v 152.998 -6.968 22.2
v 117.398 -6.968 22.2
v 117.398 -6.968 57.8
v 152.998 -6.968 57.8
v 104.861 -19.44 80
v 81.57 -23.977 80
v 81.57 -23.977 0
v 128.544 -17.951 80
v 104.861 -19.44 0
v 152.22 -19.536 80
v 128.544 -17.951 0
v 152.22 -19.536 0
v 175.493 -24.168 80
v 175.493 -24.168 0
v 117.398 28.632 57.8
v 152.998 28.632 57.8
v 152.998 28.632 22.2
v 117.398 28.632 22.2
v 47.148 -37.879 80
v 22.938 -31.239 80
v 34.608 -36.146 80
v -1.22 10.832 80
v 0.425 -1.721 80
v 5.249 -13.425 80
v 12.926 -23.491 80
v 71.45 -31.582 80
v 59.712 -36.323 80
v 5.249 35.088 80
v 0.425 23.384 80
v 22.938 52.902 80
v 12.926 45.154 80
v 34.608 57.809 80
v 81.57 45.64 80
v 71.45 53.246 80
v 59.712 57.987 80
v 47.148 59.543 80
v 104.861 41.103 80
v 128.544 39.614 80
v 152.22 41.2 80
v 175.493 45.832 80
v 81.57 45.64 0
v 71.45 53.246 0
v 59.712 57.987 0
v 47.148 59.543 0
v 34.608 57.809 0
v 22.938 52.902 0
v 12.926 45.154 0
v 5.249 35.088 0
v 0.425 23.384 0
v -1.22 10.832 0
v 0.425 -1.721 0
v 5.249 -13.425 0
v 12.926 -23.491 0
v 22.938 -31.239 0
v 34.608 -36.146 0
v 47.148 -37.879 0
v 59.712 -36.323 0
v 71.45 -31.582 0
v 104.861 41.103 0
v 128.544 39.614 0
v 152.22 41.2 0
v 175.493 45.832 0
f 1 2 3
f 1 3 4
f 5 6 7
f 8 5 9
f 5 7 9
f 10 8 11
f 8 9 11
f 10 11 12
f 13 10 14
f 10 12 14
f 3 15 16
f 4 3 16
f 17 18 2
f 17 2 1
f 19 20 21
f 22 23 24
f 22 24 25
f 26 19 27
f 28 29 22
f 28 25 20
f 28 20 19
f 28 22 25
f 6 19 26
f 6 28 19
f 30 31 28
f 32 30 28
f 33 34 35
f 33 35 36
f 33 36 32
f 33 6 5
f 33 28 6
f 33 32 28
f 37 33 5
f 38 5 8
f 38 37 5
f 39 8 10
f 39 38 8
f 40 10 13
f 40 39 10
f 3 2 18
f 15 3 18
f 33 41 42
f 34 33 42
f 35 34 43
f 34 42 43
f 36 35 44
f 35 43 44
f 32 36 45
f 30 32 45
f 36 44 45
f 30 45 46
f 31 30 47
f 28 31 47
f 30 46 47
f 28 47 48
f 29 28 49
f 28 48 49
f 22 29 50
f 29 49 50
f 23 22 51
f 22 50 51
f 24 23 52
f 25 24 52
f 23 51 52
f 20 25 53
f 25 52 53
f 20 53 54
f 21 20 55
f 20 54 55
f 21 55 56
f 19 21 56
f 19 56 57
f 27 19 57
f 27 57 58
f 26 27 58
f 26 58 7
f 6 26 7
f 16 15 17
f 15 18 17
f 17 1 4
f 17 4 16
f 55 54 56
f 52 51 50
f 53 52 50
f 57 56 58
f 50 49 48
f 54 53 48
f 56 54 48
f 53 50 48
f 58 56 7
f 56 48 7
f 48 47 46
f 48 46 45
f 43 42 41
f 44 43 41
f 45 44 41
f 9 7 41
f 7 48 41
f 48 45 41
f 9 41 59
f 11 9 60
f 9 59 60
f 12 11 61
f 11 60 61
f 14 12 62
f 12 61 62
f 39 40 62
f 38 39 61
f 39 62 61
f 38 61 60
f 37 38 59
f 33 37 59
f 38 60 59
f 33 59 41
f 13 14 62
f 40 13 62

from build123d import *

# Parameters (mm, degrees)
DODANIE_WYCI_GNI_CIE2_DEPTH     = 80
SZKIC5_W                        = 35.6
SZKIC5_H                        = 35.6
WYTNIJ_WYCI_GNI_CIE1_DEPTH      = 17.8
WYTNIJ_WYCI_GNI_CIE1_DEPTH_BACK = 17.8


with BuildPart() as part:
    # Szkic2 → Dodanie-wyciągnięcie2 (new body)
    with BuildSketch(Plane.XY):
        with BuildLine():
            Line((175.492718802, -24.168338507), (175.492718802, 45.831661493))
            ThreePointArc((175.492718802, 45.831661493), (128.54386121, 39.614419972), (81.570021048, 45.640003906))
            ThreePointArc((81.570021048, 45.640003906), (-1.219530478, 10.831661493), (81.570021048, -23.976680919))
            ThreePointArc((81.570021048, -23.976680919), (128.54386121, -17.951096985), (175.492718802, -24.168338507))
        make_face()
    extrude(amount=DODANIE_WYCI_GNI_CIE2_DEPTH)

    # Szkic5 → Wytnij-wyciągnięcie1 (cut, two sides)
    with BuildSketch(Plane.XY.offset(40)) as wytnij_wyci_gni_cie1_sk:
        with Locations((135.198453221, 10.831661493)):
            Rectangle(SZKIC5_W, SZKIC5_H)
    extrude(amount=WYTNIJ_WYCI_GNI_CIE1_DEPTH, mode=Mode.SUBTRACT)
    extrude(wytnij_wyci_gni_cie1_sk.sketch, amount=-WYTNIJ_WYCI_GNI_CIE1_DEPTH_BACK, mode=Mode.SUBTRACT)


solid = part.part
